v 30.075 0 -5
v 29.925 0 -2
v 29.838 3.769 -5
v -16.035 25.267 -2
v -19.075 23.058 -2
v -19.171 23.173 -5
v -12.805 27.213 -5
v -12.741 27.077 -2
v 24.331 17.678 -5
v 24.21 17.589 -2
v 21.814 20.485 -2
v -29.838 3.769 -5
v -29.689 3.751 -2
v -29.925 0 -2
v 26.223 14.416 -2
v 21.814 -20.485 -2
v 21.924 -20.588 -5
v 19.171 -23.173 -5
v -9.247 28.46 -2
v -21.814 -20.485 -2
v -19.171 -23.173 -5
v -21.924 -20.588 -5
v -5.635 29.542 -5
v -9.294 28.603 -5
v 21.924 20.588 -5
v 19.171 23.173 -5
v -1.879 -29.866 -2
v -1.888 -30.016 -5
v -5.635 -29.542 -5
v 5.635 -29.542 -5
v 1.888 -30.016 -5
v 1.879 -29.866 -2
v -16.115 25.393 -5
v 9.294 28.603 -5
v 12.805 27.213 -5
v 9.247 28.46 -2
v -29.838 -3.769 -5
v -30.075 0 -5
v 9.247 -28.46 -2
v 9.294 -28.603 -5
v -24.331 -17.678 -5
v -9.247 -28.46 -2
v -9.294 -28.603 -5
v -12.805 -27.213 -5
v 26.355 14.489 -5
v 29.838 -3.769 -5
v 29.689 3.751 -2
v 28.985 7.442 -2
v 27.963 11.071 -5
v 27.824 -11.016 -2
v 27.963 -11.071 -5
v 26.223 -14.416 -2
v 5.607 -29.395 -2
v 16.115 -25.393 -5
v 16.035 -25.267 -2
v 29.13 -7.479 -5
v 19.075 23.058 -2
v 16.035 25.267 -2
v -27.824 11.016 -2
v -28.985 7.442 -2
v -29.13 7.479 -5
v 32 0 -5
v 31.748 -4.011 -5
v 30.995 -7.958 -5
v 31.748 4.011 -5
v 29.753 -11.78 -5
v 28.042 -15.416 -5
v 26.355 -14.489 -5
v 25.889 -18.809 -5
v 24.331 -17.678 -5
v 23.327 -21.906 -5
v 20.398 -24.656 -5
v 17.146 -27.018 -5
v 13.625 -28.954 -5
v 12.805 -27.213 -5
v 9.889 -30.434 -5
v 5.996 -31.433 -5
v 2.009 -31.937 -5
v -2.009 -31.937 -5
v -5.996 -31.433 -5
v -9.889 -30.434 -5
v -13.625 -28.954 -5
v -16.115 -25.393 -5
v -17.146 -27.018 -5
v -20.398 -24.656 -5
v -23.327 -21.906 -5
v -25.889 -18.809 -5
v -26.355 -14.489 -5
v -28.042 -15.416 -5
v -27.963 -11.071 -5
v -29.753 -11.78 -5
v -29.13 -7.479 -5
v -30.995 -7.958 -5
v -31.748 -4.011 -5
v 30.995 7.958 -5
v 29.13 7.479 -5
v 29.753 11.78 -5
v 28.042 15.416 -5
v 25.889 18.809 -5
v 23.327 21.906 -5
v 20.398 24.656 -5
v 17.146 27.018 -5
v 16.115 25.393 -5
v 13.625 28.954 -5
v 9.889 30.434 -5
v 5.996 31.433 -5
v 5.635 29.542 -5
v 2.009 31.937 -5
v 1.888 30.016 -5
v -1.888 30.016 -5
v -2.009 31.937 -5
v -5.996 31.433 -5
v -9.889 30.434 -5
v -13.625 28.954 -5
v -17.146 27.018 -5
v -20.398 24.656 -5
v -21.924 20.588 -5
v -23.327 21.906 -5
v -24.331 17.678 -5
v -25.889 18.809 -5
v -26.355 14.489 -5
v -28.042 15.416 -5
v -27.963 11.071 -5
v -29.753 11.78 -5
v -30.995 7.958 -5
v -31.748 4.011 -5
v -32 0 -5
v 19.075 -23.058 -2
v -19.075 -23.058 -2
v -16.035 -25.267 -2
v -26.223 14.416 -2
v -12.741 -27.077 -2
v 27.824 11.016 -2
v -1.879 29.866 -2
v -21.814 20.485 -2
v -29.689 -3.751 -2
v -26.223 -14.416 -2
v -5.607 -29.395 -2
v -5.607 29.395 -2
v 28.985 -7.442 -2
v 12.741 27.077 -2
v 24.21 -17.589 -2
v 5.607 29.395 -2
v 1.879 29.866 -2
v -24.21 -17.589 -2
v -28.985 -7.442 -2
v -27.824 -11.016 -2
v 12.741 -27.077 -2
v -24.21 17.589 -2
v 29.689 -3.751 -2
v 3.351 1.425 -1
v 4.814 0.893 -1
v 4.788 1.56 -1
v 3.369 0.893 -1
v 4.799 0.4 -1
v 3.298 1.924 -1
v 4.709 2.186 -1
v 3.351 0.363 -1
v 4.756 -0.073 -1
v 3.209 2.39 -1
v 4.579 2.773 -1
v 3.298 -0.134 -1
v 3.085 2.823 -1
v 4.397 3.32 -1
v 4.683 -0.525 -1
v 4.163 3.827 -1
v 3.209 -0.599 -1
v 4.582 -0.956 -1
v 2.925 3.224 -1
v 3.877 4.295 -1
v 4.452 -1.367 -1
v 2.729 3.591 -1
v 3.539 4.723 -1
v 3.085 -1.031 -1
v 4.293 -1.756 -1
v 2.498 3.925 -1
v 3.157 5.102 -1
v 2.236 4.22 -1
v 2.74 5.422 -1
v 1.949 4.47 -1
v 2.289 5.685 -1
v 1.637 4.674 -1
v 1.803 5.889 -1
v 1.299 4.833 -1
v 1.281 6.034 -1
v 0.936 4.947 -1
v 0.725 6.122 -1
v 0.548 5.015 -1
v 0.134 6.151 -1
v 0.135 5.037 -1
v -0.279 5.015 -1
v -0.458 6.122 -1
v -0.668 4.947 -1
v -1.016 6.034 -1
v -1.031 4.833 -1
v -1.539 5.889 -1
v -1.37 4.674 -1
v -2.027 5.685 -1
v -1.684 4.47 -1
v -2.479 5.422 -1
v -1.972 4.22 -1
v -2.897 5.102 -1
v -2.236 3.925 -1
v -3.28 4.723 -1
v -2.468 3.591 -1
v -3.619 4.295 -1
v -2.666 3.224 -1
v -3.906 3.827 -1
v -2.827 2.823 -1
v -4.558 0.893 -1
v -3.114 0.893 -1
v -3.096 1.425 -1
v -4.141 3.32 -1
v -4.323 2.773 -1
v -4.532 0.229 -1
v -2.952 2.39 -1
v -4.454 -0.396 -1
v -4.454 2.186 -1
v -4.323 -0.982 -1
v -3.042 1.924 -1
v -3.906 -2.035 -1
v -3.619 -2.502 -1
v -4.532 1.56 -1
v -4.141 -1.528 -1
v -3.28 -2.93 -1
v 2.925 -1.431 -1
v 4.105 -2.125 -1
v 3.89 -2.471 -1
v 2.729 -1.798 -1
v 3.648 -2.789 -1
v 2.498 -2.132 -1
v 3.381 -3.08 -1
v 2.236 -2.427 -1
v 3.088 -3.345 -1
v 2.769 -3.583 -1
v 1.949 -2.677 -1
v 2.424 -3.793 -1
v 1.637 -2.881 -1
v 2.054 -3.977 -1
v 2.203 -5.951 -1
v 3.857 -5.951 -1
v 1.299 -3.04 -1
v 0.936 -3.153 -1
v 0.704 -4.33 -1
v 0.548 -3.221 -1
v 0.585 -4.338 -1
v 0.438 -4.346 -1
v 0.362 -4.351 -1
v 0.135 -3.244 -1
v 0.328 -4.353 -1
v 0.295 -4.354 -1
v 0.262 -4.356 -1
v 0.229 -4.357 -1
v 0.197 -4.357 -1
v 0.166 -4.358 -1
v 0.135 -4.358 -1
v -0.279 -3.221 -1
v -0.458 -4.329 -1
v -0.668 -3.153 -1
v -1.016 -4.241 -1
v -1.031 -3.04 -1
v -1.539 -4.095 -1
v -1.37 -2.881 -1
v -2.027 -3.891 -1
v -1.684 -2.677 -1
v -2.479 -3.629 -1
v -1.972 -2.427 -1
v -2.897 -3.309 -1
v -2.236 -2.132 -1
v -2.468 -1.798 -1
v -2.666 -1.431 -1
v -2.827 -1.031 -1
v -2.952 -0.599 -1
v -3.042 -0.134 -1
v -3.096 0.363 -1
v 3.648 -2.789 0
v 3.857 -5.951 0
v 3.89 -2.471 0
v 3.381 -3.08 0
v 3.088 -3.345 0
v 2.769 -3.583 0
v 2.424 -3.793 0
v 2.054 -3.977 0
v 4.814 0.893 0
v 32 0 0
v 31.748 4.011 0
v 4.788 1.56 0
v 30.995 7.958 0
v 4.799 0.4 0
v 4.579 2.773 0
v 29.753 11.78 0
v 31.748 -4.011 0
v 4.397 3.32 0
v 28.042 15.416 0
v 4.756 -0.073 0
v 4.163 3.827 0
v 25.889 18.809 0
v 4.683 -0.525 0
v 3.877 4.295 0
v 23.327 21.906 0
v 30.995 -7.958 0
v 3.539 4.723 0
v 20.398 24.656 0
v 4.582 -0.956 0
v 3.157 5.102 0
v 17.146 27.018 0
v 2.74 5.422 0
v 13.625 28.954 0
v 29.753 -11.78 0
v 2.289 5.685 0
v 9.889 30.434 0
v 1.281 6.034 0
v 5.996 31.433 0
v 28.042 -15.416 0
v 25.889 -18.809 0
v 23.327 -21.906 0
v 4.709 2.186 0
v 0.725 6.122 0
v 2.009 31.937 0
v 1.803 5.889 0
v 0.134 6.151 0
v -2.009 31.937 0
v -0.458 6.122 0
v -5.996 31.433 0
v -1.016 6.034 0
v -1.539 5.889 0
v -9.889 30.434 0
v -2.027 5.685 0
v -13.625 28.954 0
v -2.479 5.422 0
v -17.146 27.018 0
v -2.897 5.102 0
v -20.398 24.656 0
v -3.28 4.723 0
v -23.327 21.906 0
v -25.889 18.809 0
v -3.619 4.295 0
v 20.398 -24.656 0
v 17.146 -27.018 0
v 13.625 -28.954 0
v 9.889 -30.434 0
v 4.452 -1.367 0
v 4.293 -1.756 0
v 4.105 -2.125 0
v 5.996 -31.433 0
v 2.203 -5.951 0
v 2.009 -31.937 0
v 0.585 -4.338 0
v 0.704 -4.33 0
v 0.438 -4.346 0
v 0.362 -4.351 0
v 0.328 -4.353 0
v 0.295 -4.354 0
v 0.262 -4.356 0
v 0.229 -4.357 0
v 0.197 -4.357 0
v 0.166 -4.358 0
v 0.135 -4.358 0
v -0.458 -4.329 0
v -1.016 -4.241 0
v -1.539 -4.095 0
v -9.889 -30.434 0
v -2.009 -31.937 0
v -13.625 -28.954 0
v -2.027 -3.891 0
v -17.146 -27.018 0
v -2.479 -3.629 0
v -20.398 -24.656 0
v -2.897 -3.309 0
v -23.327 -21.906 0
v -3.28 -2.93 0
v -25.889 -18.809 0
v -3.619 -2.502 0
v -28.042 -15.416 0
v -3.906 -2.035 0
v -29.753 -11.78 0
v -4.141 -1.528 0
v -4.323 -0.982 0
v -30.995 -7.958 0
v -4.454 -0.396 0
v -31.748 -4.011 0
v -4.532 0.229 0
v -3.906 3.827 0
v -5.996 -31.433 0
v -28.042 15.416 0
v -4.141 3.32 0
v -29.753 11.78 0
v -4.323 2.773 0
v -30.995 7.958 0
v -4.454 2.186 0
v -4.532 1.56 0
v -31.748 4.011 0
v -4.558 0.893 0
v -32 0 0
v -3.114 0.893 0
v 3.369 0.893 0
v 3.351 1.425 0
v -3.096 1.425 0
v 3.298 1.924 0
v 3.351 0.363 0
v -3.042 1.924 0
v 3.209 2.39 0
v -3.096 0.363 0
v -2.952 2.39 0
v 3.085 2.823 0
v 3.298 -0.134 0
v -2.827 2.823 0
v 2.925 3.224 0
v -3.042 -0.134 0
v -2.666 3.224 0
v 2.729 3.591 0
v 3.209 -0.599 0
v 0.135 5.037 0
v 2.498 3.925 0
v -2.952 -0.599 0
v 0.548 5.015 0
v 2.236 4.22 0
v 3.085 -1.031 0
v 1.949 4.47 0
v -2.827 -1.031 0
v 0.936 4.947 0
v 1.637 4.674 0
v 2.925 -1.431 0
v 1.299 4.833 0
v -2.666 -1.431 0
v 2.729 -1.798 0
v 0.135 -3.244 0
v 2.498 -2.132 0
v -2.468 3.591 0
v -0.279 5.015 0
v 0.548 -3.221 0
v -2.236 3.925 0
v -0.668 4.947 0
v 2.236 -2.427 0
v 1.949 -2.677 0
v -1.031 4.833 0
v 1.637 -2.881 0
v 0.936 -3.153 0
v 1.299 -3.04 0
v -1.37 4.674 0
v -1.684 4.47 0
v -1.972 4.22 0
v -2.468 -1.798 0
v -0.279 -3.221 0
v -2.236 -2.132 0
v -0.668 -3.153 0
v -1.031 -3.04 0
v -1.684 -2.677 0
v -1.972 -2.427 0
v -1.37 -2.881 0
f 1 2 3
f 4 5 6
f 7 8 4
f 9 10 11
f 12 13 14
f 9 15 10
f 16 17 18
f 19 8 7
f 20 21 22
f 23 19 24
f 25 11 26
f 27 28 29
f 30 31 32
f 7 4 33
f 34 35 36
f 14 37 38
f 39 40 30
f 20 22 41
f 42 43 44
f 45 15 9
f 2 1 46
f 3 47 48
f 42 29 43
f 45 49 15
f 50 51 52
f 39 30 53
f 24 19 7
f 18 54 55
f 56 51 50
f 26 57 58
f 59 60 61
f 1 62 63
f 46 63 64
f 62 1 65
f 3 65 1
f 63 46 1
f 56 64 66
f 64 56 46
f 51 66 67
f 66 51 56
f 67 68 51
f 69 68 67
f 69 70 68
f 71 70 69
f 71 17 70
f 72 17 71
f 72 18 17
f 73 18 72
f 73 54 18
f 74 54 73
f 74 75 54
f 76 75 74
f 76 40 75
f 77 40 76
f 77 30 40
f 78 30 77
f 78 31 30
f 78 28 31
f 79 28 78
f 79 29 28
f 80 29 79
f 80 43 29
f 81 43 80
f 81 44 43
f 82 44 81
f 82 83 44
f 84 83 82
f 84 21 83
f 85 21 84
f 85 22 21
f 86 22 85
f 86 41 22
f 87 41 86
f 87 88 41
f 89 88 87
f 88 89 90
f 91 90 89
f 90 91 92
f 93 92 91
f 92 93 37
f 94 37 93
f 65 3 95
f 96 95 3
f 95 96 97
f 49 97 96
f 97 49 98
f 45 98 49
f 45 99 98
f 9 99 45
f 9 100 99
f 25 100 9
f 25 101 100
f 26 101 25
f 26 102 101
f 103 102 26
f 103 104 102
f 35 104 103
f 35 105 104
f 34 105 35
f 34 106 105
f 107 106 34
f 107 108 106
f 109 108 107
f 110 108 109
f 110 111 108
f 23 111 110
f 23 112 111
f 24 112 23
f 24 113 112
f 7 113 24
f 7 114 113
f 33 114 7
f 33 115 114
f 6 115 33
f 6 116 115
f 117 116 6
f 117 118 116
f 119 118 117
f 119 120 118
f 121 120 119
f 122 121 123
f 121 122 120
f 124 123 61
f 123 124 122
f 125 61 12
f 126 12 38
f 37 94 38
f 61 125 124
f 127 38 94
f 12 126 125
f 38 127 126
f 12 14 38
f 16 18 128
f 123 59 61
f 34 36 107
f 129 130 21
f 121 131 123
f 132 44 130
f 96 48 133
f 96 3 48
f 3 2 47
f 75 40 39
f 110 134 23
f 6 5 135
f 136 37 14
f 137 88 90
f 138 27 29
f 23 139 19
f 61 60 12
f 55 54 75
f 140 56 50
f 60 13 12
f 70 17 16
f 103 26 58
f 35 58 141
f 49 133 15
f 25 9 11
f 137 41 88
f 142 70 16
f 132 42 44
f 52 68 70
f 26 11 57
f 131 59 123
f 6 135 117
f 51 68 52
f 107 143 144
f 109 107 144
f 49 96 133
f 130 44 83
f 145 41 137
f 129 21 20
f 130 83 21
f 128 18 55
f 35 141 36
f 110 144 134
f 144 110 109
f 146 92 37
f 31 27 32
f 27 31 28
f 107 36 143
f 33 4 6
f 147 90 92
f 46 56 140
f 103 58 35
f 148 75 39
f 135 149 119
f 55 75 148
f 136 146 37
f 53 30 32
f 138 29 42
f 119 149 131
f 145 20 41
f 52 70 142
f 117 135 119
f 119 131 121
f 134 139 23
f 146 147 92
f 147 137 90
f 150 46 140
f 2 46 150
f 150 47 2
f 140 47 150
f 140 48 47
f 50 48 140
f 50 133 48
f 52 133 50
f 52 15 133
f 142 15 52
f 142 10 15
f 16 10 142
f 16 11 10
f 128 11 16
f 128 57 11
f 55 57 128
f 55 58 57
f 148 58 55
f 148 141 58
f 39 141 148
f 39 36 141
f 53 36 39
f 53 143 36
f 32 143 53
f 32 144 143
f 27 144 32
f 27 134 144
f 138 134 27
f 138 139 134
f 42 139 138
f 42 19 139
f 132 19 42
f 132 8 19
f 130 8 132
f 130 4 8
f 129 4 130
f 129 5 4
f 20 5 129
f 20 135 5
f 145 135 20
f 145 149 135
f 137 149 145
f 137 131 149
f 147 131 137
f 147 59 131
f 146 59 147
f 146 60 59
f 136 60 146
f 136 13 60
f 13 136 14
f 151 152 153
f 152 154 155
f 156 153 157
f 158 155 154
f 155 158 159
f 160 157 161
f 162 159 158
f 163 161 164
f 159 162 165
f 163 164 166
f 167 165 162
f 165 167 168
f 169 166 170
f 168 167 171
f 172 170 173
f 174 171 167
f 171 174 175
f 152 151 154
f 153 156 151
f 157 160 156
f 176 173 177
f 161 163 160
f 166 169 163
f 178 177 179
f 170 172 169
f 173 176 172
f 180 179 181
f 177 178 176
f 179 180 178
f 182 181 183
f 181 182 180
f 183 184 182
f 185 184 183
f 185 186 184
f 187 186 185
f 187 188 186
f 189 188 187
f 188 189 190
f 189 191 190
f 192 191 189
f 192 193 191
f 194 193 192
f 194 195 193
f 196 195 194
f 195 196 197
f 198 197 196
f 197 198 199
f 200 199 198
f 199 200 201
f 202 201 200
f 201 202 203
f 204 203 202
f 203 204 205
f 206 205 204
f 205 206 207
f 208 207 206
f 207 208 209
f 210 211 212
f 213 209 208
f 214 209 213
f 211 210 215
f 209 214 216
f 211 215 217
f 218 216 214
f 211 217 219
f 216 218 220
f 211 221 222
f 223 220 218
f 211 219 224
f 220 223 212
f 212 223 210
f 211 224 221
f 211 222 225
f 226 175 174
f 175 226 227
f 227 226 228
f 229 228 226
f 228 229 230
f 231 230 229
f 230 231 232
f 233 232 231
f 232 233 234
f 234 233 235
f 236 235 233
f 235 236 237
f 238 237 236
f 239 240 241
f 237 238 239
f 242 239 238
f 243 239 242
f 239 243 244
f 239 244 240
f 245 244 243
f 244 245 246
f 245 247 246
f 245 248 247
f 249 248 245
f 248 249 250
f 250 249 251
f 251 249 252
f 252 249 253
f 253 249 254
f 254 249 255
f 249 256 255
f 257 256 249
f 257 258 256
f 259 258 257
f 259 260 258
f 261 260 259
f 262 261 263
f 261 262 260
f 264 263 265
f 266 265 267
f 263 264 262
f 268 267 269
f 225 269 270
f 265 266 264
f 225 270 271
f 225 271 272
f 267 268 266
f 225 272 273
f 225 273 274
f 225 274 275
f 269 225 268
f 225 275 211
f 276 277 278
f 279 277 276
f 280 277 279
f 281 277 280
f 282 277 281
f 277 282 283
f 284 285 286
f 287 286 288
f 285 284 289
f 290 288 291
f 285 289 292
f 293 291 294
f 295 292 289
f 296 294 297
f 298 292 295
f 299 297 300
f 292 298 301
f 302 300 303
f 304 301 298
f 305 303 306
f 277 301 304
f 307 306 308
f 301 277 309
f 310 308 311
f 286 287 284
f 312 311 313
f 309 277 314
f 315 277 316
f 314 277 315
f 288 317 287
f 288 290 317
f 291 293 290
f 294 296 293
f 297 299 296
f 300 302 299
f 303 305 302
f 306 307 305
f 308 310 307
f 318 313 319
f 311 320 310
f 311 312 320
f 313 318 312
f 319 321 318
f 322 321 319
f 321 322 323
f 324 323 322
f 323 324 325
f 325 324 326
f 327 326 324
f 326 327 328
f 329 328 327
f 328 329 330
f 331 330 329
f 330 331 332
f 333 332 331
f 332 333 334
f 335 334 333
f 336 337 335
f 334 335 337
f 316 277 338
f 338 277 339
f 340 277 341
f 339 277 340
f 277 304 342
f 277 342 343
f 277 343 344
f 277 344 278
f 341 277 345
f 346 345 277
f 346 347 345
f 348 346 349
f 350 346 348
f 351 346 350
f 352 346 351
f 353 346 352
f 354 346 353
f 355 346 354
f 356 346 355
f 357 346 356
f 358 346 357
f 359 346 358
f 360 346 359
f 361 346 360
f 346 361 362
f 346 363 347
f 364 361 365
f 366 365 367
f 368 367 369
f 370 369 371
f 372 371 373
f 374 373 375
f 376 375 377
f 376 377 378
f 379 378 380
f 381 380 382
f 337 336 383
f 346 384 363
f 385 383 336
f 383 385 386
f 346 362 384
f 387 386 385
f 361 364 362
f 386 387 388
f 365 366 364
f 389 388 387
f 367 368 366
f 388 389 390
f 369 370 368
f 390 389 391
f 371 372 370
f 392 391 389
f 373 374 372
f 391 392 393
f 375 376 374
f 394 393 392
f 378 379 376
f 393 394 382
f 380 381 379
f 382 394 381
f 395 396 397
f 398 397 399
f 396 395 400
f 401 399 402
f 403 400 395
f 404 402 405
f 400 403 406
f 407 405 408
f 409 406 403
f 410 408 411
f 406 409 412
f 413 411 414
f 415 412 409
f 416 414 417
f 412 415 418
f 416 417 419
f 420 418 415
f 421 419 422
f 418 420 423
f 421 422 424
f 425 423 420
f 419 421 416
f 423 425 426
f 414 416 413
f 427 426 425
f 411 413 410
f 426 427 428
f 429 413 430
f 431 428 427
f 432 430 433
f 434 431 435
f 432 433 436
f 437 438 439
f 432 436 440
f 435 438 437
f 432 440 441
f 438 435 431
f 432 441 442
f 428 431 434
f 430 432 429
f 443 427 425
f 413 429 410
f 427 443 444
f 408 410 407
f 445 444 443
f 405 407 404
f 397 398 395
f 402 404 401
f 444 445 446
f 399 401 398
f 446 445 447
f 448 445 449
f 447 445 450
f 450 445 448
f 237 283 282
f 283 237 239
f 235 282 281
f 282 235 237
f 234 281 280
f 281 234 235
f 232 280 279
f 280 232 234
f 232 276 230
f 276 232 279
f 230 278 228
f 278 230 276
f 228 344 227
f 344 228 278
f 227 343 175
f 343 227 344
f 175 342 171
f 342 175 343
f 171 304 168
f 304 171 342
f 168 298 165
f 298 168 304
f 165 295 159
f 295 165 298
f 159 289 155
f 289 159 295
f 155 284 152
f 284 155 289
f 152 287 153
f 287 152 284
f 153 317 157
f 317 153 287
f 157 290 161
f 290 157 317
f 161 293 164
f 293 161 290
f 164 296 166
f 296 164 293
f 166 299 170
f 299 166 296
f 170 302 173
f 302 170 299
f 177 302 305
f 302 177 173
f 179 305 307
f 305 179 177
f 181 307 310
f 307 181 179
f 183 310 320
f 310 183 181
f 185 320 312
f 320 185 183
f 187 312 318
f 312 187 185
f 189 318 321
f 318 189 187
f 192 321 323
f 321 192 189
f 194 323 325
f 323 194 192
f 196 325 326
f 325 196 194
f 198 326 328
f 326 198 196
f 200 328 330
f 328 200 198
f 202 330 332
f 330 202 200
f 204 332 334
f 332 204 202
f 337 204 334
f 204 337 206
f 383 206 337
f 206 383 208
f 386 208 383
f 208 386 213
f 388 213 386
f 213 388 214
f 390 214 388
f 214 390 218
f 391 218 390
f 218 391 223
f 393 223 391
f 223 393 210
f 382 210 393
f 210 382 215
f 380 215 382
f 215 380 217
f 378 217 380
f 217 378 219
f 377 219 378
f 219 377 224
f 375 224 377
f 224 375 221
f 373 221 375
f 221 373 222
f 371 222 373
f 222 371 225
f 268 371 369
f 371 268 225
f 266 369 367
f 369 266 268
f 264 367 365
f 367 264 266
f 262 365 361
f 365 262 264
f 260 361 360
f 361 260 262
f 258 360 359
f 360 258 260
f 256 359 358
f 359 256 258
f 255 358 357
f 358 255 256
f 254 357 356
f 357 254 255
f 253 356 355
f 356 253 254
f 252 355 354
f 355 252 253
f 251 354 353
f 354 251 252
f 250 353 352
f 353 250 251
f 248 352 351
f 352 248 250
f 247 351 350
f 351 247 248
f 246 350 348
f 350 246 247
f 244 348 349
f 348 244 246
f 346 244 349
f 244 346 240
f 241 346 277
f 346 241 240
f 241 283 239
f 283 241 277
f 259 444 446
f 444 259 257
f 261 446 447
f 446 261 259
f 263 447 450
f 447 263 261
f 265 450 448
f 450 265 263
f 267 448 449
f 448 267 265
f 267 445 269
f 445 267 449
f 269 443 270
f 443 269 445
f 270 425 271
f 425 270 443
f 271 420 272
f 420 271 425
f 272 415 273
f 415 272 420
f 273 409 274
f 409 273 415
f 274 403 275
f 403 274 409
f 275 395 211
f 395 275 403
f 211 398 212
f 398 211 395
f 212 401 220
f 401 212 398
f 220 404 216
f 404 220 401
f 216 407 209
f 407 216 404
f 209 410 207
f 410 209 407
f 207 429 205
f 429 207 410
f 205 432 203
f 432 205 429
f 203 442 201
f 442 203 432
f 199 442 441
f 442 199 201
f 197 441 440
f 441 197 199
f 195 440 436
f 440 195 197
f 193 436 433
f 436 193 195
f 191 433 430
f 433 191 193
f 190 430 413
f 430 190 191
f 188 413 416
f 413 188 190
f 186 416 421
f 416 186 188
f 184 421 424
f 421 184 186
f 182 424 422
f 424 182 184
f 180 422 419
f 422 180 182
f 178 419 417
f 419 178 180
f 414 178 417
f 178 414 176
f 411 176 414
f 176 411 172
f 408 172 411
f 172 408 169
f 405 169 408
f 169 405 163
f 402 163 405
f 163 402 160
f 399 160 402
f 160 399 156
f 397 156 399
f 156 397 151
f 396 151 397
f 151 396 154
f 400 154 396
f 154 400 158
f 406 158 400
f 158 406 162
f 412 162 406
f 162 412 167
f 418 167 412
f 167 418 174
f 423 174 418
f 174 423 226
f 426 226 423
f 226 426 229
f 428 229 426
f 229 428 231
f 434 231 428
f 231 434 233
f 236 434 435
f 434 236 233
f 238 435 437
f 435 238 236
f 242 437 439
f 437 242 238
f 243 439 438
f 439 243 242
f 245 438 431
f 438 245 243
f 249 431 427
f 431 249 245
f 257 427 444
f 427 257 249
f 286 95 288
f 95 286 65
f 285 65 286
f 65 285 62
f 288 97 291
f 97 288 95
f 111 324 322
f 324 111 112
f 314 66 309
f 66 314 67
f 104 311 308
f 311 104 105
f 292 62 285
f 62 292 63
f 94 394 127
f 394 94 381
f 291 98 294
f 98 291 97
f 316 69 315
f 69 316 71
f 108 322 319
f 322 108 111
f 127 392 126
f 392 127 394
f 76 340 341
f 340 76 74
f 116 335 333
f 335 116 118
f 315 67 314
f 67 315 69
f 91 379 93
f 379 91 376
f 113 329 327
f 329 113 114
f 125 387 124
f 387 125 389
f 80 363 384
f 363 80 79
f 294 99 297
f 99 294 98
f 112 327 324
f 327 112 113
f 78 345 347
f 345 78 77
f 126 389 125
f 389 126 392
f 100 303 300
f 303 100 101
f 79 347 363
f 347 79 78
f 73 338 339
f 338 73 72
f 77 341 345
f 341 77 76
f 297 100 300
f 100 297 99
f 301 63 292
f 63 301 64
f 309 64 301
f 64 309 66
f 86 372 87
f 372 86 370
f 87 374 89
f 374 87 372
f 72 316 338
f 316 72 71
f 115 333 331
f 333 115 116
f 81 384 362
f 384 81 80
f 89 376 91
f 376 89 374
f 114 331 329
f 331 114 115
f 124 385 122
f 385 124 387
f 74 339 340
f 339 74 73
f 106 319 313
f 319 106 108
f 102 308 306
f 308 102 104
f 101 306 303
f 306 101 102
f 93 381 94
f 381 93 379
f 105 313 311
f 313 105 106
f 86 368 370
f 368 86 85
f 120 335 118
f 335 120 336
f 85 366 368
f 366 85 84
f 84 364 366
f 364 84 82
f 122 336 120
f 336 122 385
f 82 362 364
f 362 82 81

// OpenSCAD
$fn = 50;


difference() {
	union() {
		translate(v = [0, 0, -5.0000000000]) {
			cylinder(h = 5, r = 32.0000000000);
		}
	}
	union() {
		#translate(v = [0, 0, -5.0000000000]) {
			cylinder(h = 3, r1 = 30.0750000000, r2 = 29.9250000000);
		}
		translate(v = [0, 0, -1]) {
			linear_extrude(height = 1) {
				text(font = "Impact", halign = "center", size = 10, text = "Q", valign = "center");
			}
		}
	}
}
